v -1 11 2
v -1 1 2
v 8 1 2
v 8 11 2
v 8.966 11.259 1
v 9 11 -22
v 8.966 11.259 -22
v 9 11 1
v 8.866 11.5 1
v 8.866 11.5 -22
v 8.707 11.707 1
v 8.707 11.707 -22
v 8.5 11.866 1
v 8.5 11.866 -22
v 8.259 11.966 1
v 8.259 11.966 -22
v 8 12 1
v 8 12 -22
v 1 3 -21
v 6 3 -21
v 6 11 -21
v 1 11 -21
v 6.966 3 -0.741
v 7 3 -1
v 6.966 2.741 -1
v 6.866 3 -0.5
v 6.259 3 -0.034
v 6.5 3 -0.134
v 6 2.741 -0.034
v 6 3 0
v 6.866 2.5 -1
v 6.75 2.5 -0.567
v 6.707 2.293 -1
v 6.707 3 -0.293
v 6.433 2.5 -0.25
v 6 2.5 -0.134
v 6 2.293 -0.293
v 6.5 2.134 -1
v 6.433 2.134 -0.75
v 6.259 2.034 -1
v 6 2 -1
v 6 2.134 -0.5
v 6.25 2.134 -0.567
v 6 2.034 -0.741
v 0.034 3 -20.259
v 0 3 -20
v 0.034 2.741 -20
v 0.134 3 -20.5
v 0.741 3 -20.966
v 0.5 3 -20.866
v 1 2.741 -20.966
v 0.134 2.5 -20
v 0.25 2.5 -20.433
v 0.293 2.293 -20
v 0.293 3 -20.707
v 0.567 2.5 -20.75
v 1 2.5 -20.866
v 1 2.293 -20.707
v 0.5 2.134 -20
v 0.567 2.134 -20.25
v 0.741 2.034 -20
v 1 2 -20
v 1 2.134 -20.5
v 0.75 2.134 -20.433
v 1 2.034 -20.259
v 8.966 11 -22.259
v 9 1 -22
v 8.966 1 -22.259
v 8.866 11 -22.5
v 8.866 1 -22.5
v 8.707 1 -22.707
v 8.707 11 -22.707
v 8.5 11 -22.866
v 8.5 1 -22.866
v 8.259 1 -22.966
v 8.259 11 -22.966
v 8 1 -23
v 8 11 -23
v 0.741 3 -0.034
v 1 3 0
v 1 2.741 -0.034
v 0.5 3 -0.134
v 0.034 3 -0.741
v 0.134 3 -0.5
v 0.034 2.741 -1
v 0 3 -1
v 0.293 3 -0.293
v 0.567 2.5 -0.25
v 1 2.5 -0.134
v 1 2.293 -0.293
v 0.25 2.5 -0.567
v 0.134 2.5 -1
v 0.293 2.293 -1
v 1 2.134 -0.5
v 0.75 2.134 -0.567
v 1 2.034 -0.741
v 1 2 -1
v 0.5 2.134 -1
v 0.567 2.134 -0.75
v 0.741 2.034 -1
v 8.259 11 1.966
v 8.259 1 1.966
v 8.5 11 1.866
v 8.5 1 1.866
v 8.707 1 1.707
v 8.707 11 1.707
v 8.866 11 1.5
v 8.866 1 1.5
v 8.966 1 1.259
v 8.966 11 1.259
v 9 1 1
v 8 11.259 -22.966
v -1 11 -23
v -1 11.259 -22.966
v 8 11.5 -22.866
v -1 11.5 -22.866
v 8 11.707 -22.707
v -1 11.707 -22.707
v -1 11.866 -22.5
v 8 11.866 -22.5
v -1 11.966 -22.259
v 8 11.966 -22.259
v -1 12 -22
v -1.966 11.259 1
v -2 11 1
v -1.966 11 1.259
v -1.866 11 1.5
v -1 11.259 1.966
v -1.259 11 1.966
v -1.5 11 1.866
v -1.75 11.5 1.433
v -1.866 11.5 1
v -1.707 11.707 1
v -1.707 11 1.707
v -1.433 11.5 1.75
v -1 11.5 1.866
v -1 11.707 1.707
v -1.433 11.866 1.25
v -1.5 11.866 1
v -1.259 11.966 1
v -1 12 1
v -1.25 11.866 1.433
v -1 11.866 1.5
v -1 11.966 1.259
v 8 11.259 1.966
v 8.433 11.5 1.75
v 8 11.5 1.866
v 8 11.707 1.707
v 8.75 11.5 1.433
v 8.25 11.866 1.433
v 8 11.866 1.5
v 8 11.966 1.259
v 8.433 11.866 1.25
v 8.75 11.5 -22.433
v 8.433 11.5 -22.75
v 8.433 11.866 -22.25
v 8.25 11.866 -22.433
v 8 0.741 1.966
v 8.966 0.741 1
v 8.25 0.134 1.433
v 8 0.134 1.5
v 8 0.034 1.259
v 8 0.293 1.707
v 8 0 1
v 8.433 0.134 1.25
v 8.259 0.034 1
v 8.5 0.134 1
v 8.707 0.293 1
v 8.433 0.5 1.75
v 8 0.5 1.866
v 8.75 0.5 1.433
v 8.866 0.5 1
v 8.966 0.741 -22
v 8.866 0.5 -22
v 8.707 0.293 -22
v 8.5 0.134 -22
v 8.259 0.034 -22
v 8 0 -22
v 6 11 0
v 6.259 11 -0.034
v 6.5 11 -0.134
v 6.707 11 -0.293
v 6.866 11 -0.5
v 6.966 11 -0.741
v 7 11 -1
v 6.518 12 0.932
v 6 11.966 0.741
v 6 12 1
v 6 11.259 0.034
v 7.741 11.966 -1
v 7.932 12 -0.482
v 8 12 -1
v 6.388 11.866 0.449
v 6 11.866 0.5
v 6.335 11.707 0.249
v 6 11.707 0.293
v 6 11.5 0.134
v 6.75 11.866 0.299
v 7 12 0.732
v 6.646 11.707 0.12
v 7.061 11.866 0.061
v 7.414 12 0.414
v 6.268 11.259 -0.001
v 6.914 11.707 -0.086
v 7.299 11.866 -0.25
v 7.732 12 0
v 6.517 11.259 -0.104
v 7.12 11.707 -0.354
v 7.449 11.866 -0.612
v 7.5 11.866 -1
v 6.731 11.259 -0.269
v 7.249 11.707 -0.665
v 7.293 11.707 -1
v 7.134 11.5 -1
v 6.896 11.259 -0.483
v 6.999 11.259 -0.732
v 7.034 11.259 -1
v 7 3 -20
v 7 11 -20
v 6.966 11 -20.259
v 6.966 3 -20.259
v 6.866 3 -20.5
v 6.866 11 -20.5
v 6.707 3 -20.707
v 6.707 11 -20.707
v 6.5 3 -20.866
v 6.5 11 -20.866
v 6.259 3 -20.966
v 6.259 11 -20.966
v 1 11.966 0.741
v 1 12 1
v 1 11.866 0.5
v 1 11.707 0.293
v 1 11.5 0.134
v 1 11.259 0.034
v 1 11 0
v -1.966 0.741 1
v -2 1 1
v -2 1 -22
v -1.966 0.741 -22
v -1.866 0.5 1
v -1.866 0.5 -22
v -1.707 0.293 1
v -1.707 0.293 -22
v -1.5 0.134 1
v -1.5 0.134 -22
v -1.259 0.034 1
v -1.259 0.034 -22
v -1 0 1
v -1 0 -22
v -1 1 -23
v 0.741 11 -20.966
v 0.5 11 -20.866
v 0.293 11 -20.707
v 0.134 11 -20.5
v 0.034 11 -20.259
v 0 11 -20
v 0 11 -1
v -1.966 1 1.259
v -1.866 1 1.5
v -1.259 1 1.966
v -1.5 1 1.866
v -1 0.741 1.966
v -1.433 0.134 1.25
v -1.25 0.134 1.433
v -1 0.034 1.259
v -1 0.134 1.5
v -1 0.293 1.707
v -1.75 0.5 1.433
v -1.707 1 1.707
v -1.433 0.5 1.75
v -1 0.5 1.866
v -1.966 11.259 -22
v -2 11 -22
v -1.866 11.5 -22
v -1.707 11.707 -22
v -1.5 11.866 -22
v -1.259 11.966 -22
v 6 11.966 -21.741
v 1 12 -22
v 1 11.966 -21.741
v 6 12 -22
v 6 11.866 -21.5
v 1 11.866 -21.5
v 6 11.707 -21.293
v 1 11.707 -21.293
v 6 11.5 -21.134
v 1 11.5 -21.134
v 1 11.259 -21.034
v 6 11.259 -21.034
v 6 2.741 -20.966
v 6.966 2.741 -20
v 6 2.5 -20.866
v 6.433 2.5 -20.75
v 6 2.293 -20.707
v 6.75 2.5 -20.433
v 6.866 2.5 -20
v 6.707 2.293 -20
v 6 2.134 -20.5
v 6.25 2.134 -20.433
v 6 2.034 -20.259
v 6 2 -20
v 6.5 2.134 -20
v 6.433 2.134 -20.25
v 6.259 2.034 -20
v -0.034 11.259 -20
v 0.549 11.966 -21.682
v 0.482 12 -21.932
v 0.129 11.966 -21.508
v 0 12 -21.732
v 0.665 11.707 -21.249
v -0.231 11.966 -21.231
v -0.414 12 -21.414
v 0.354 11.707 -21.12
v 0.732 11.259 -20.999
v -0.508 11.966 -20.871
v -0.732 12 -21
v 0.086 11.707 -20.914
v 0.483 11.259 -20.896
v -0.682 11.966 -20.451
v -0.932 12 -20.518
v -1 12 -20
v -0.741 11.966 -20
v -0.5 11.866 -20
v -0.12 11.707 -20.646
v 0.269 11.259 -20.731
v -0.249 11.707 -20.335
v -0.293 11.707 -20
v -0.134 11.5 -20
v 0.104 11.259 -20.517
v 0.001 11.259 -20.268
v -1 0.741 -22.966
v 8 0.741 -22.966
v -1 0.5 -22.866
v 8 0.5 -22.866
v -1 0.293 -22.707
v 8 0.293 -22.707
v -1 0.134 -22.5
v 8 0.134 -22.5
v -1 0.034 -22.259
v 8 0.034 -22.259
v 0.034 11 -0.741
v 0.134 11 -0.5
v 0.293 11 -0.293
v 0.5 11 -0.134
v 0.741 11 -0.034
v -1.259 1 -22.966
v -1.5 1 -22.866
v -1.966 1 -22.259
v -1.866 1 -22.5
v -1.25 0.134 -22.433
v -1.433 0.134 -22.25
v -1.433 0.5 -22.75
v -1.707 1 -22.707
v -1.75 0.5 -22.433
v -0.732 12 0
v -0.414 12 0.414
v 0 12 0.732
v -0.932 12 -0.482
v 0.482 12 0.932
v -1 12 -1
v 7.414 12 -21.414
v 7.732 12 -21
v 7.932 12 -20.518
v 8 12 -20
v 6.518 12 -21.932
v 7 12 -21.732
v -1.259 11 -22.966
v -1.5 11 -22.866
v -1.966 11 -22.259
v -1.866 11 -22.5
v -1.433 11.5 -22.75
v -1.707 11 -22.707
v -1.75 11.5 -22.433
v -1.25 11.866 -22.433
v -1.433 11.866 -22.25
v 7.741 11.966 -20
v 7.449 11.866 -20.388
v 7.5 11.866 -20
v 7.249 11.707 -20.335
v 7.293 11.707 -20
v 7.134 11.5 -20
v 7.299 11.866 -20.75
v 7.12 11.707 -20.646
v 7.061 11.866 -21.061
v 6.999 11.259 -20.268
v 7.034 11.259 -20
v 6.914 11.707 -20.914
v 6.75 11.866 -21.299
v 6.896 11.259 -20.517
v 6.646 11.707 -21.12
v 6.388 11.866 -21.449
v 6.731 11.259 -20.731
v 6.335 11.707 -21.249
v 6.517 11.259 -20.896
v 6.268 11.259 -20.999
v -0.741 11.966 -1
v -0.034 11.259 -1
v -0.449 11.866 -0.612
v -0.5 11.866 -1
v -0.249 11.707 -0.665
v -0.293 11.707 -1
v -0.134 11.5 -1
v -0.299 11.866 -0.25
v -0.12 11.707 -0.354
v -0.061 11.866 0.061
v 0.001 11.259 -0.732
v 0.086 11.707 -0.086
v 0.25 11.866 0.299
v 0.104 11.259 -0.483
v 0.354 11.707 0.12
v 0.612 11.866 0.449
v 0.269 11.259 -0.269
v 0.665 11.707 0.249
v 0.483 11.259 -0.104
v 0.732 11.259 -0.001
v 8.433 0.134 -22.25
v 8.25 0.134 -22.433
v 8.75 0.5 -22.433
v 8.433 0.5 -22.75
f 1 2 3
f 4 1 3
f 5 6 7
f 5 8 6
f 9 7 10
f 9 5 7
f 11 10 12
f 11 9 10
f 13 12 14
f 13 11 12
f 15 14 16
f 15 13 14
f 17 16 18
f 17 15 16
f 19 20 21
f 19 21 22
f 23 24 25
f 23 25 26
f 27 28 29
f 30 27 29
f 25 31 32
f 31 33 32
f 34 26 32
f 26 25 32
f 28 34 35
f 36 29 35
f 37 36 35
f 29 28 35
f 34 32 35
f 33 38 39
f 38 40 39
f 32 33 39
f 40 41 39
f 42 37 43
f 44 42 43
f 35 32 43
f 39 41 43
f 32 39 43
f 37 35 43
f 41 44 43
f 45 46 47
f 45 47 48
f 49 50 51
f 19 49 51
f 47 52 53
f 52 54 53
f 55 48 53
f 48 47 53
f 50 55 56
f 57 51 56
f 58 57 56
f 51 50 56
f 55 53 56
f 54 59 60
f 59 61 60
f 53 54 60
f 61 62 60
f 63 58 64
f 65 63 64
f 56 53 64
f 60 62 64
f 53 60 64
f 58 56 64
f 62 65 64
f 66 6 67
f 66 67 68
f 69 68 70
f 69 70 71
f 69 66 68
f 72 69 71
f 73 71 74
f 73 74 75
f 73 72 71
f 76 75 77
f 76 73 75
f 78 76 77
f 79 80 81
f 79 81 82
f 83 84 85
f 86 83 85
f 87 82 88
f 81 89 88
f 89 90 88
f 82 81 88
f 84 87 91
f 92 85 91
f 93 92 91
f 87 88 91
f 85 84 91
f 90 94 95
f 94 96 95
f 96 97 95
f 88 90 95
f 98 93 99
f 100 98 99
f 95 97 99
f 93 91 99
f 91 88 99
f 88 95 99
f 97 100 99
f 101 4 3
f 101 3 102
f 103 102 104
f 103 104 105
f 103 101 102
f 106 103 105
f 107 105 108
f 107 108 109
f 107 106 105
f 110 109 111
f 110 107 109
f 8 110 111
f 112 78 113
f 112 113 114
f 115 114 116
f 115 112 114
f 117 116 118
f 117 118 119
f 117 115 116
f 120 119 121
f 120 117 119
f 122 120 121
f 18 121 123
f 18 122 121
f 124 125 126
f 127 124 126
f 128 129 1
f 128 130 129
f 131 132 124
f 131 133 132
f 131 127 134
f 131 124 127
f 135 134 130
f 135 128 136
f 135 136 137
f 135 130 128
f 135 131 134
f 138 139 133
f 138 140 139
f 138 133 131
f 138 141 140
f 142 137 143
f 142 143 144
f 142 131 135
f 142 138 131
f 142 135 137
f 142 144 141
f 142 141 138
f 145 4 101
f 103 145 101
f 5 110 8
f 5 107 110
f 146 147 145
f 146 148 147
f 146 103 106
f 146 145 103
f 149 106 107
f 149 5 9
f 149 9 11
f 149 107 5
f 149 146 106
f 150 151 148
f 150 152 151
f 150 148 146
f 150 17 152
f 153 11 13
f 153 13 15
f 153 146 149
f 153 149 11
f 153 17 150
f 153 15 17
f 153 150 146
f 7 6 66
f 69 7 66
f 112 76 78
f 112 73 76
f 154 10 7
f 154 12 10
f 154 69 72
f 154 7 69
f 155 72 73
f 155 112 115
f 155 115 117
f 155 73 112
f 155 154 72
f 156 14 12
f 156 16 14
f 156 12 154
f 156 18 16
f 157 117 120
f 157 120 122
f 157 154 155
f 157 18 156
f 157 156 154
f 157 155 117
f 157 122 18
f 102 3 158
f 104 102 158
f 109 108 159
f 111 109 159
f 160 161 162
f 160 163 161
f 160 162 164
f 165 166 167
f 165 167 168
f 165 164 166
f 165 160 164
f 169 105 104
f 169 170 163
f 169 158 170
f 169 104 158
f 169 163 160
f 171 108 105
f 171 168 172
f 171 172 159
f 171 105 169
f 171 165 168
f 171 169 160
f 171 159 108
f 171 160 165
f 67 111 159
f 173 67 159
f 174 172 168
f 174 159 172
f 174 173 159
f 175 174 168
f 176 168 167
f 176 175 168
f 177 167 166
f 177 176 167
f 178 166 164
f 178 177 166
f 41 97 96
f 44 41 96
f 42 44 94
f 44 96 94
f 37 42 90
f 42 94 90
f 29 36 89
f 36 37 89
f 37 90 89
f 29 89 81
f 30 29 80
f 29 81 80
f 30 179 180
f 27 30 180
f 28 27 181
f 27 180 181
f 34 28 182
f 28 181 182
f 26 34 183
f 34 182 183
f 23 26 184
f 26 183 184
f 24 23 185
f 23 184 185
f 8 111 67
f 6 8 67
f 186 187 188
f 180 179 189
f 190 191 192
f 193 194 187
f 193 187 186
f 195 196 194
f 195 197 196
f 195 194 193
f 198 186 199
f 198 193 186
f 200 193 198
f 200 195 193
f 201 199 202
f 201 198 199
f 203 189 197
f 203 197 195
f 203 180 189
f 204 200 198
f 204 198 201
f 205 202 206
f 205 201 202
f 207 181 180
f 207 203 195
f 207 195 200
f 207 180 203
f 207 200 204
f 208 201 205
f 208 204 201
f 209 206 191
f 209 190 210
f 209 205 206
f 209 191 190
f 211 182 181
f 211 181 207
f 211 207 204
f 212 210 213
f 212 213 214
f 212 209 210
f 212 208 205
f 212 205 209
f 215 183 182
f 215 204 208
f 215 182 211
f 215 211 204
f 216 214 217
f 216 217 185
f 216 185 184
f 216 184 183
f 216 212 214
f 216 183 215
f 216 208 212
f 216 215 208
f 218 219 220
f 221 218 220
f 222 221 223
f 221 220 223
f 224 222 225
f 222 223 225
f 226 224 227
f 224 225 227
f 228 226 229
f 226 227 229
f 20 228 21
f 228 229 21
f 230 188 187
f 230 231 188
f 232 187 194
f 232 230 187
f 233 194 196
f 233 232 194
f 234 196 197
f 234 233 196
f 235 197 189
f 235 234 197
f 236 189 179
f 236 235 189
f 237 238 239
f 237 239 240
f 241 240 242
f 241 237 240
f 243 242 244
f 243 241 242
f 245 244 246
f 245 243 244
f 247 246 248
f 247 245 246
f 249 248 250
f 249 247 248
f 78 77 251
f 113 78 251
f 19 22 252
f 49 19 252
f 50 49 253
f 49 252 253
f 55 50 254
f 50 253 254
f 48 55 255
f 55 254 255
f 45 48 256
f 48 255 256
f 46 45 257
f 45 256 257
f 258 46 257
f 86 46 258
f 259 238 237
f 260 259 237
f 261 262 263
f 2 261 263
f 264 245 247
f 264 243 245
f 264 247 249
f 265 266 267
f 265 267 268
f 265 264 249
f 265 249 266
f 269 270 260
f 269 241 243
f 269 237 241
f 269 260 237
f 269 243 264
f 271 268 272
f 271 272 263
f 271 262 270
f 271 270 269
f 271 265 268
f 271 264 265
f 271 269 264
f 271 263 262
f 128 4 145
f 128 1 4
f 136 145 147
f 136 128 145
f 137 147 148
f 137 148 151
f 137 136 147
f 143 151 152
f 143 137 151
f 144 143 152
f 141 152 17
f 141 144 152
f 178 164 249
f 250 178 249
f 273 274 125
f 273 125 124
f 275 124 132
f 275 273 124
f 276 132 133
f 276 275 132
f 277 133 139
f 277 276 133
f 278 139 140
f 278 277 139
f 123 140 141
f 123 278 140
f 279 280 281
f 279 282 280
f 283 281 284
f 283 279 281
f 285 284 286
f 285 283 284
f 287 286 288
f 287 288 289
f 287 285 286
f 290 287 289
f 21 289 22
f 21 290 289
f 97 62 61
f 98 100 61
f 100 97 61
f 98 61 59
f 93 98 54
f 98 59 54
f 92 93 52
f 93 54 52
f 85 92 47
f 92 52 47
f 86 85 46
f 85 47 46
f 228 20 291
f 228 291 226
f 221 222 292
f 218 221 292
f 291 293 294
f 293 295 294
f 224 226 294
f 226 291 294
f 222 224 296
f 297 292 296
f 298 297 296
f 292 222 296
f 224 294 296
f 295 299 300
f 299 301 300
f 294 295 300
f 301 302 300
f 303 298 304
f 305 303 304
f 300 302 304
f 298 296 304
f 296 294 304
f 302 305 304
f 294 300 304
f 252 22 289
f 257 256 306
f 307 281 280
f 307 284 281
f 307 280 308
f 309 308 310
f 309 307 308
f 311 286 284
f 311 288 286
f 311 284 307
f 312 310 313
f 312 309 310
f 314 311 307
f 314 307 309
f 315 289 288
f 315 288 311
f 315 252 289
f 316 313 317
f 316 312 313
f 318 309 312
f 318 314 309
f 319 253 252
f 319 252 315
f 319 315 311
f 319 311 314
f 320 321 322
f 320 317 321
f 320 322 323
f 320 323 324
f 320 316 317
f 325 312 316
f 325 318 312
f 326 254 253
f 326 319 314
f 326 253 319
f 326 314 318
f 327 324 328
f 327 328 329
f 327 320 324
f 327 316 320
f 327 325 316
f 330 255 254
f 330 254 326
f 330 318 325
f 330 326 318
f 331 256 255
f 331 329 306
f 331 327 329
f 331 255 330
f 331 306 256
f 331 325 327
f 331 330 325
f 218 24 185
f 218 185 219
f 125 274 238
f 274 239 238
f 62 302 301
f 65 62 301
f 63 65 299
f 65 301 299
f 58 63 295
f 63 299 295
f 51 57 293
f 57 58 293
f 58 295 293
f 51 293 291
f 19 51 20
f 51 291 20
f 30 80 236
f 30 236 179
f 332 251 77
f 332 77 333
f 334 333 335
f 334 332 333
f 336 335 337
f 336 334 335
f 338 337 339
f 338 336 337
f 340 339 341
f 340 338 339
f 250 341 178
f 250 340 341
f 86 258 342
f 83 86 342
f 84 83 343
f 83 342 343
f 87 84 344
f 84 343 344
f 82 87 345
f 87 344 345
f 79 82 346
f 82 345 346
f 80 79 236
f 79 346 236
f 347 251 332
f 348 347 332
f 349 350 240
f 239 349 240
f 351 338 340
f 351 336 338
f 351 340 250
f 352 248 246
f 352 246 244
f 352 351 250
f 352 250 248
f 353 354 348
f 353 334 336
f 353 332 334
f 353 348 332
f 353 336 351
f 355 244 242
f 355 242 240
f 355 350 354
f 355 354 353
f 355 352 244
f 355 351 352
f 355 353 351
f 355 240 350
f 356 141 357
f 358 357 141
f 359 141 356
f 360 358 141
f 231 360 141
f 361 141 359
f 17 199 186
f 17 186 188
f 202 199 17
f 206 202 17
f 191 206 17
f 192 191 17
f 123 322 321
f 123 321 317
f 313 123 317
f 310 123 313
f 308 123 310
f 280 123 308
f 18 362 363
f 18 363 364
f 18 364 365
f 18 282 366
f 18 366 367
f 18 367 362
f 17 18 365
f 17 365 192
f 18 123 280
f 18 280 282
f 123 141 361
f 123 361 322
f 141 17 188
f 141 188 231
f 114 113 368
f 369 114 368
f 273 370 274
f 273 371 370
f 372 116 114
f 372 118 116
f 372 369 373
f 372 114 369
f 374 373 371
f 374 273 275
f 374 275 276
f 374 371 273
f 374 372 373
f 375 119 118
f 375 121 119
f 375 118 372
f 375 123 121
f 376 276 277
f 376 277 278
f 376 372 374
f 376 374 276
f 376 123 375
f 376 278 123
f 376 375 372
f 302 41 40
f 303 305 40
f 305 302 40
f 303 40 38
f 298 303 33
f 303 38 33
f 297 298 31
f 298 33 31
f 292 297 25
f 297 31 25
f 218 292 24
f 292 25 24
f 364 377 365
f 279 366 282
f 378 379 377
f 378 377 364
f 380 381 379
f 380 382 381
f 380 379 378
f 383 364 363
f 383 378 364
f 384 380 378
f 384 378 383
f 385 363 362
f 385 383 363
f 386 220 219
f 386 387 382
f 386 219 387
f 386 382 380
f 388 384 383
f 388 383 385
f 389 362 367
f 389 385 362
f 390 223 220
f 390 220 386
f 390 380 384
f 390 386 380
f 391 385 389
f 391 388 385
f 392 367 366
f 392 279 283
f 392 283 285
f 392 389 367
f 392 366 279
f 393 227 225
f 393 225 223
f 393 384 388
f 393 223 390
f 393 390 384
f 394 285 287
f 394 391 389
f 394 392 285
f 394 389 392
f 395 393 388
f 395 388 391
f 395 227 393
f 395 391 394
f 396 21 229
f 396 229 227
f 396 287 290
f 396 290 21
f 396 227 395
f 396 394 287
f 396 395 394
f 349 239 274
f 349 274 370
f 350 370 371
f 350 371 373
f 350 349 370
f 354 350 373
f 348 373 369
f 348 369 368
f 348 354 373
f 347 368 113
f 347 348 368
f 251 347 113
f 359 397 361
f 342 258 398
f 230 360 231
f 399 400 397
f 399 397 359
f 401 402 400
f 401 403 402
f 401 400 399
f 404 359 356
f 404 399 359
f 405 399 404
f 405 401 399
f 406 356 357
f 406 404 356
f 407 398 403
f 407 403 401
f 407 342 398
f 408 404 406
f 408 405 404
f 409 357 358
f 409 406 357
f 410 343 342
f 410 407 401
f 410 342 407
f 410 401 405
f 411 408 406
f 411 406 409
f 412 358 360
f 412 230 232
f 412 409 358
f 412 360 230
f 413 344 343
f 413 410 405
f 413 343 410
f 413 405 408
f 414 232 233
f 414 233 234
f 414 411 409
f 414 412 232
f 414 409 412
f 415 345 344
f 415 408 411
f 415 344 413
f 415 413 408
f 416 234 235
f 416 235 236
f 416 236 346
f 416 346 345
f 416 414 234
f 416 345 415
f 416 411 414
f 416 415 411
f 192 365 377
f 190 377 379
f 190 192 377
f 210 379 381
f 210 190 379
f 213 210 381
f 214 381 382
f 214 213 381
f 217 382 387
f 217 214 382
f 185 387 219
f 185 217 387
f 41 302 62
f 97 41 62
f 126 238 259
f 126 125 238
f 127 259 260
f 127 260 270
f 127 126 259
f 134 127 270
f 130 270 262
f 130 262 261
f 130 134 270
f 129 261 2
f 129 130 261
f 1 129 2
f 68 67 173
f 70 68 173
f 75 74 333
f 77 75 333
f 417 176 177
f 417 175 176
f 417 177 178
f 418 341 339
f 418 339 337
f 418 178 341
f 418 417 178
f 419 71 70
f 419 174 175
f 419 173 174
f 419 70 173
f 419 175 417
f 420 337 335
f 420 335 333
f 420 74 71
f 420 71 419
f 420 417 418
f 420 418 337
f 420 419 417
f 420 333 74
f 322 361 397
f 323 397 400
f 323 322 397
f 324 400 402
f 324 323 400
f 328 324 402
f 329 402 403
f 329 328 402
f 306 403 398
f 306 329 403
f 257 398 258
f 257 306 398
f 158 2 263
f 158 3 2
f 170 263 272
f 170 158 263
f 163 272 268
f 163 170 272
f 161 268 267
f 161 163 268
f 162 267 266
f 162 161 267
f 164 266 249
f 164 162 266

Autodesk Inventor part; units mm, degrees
ref_plane "YZ Plane" through (0, 0, 0) normal (1, 0, 0) x (0, 1, 0)
ref_plane "XZ Plane" through (0, 0, 0) normal (0, 1, 0) x (-1, 0, 0)
ref_plane "XY Plane" through (0, 0, 0) normal (0, 0, 1) x (1, 0, 0)
sketch "Sketch1" plane through (0, 0, 0) normal (0, 1, 0) x (-1, 0, 0)
  line L0 (0, 0) -> (-7, 0)
  line L1 (-7, 0) -> (-7, -21)
  line L2 (-7, -21) -> (0, -21)
  line L3 (0, -21) -> (0, 0)
  line L4 (0, 0) -> (2, 0)
  line L5 (2, 0) -> (2, 2)
  line L6 (2, 2) -> (0, 2)
  line L7 (0, 2) -> (0, 0)
  line L8 (-7, -21) -> (-9, -21)
  line L9 (-9, -21) -> (-9, -23)
  line L10 (-9, -23) -> (-7, -23)
  line L11 (-7, -23) -> (-7, -21)
  line L12 (-9, -23) -> (2, -23)
  line L13 (2, -23) -> (2, 2)
  line L14 (2, 2) -> (-9, 2)
  line L15 (-9, 2) -> (-9, -23)
  dimension "d0" = 7
  dimension "d1" = 21
  dimension "d2" = 2
  dimension "d3" = 2
  dimension "d4" = 2
  dimension "d5" = 2
extrude "Extrusion1" add sketch "Sketch1" along normal blind 2
sketch "Sketch2" plane through (0, 2, 0) normal (0, 1, 0) x (1, 0, 0)
  line L0 (-2, -2) -> (9, -2) projected
  line L1 (-2, -2) -> (0, -2)
  line L2 (0, -2) -> (0, 0)
  line L3 (0, 0) -> (-2, 0)
  line L4 (-2, 0) -> (-2, -2)
  line L5 (9, -2) -> (9, 23) projected
  line L6 (9, 23) -> (7, 23)
  line L7 (7, 23) -> (7, 21)
  line L8 (7, 21) -> (9, 21)
  line L9 (9, 21) -> (9, 23)
  line L10 (0, 0) -> (7, 0)
  line L11 (7, 0) -> (7, 21)
  line L12 (7, 21) -> (0, 21)
  line L13 (0, 21) -> (0, 0)
  line L14 (-2, 23) -> (-2, -2) projected
  line L15 (-2, -2) -> (9, -2)
  line L16 (9, -2) -> (9, 23)
  line L17 (9, 23) -> (-2, 23)
  line L18 (-2, 23) -> (-2, -2)
  dimension "d8" = 2
  dimension "d9" = 2
  dimension "d10" = 2
  dimension "d11" = 2
extrude "Extrusion2" add sketch "Sketch2" along normal blind 10 contours L4 L3 L2 L0 | L2 L10 L11 L8 L5 L0 | L14 L17 L7 L12 L13 L3 | L8 L7 L6 L5
fillet "Fillet1" radius 1 8 edges at (0, 7, -21) (0, 7, 0) (7, 7, 0) (7, 7, -21) (9, 6, 2) (-2, 6, 2) (-2, 6, -23) (9, 6, -23)
fillet "Fillet2" radius 1 32 edges at (0.2929, 2, -0.2929) (3.5, 2, 0) (6.7071, 2, -0.2929) (7, 2, -10.5) (6.7071, 2, -20.7071) (3.5, 2, -21) (0.2929, 2, -20.7071) (0, 2, -10.5) (6.7071, 12, -20.7071) (7, 12, -10.5) (6.7071, 12, -0.2929) (3.5, 12, 0) (0.2929, 12, -0.2929) (0, 12, -10.5) (0.2929, 12, -20.7071) (3.5, 12, -21) (-1.7071, 12, -22.7071) (-2, 12, -10.5) (-1.7071, 12, 1.7071) (3.5, 12, 2) (8.7071, 12, 1.7071) (9, 12, -10.5) (8.7071, 12, -22.7071) (3.5, 12, -23) (8.7071, 0, -22.7071) (3.5, 0, -23) (-1.7071, 0, -22.7071) (-2, 0, -10.5) (-1.7071, 0, 1.7071) (3.5, 0, 2) (8.7071, 0, 1.7071) (9, 0, -10.5)
properties part number "MechanicalPencilLeadCap"
